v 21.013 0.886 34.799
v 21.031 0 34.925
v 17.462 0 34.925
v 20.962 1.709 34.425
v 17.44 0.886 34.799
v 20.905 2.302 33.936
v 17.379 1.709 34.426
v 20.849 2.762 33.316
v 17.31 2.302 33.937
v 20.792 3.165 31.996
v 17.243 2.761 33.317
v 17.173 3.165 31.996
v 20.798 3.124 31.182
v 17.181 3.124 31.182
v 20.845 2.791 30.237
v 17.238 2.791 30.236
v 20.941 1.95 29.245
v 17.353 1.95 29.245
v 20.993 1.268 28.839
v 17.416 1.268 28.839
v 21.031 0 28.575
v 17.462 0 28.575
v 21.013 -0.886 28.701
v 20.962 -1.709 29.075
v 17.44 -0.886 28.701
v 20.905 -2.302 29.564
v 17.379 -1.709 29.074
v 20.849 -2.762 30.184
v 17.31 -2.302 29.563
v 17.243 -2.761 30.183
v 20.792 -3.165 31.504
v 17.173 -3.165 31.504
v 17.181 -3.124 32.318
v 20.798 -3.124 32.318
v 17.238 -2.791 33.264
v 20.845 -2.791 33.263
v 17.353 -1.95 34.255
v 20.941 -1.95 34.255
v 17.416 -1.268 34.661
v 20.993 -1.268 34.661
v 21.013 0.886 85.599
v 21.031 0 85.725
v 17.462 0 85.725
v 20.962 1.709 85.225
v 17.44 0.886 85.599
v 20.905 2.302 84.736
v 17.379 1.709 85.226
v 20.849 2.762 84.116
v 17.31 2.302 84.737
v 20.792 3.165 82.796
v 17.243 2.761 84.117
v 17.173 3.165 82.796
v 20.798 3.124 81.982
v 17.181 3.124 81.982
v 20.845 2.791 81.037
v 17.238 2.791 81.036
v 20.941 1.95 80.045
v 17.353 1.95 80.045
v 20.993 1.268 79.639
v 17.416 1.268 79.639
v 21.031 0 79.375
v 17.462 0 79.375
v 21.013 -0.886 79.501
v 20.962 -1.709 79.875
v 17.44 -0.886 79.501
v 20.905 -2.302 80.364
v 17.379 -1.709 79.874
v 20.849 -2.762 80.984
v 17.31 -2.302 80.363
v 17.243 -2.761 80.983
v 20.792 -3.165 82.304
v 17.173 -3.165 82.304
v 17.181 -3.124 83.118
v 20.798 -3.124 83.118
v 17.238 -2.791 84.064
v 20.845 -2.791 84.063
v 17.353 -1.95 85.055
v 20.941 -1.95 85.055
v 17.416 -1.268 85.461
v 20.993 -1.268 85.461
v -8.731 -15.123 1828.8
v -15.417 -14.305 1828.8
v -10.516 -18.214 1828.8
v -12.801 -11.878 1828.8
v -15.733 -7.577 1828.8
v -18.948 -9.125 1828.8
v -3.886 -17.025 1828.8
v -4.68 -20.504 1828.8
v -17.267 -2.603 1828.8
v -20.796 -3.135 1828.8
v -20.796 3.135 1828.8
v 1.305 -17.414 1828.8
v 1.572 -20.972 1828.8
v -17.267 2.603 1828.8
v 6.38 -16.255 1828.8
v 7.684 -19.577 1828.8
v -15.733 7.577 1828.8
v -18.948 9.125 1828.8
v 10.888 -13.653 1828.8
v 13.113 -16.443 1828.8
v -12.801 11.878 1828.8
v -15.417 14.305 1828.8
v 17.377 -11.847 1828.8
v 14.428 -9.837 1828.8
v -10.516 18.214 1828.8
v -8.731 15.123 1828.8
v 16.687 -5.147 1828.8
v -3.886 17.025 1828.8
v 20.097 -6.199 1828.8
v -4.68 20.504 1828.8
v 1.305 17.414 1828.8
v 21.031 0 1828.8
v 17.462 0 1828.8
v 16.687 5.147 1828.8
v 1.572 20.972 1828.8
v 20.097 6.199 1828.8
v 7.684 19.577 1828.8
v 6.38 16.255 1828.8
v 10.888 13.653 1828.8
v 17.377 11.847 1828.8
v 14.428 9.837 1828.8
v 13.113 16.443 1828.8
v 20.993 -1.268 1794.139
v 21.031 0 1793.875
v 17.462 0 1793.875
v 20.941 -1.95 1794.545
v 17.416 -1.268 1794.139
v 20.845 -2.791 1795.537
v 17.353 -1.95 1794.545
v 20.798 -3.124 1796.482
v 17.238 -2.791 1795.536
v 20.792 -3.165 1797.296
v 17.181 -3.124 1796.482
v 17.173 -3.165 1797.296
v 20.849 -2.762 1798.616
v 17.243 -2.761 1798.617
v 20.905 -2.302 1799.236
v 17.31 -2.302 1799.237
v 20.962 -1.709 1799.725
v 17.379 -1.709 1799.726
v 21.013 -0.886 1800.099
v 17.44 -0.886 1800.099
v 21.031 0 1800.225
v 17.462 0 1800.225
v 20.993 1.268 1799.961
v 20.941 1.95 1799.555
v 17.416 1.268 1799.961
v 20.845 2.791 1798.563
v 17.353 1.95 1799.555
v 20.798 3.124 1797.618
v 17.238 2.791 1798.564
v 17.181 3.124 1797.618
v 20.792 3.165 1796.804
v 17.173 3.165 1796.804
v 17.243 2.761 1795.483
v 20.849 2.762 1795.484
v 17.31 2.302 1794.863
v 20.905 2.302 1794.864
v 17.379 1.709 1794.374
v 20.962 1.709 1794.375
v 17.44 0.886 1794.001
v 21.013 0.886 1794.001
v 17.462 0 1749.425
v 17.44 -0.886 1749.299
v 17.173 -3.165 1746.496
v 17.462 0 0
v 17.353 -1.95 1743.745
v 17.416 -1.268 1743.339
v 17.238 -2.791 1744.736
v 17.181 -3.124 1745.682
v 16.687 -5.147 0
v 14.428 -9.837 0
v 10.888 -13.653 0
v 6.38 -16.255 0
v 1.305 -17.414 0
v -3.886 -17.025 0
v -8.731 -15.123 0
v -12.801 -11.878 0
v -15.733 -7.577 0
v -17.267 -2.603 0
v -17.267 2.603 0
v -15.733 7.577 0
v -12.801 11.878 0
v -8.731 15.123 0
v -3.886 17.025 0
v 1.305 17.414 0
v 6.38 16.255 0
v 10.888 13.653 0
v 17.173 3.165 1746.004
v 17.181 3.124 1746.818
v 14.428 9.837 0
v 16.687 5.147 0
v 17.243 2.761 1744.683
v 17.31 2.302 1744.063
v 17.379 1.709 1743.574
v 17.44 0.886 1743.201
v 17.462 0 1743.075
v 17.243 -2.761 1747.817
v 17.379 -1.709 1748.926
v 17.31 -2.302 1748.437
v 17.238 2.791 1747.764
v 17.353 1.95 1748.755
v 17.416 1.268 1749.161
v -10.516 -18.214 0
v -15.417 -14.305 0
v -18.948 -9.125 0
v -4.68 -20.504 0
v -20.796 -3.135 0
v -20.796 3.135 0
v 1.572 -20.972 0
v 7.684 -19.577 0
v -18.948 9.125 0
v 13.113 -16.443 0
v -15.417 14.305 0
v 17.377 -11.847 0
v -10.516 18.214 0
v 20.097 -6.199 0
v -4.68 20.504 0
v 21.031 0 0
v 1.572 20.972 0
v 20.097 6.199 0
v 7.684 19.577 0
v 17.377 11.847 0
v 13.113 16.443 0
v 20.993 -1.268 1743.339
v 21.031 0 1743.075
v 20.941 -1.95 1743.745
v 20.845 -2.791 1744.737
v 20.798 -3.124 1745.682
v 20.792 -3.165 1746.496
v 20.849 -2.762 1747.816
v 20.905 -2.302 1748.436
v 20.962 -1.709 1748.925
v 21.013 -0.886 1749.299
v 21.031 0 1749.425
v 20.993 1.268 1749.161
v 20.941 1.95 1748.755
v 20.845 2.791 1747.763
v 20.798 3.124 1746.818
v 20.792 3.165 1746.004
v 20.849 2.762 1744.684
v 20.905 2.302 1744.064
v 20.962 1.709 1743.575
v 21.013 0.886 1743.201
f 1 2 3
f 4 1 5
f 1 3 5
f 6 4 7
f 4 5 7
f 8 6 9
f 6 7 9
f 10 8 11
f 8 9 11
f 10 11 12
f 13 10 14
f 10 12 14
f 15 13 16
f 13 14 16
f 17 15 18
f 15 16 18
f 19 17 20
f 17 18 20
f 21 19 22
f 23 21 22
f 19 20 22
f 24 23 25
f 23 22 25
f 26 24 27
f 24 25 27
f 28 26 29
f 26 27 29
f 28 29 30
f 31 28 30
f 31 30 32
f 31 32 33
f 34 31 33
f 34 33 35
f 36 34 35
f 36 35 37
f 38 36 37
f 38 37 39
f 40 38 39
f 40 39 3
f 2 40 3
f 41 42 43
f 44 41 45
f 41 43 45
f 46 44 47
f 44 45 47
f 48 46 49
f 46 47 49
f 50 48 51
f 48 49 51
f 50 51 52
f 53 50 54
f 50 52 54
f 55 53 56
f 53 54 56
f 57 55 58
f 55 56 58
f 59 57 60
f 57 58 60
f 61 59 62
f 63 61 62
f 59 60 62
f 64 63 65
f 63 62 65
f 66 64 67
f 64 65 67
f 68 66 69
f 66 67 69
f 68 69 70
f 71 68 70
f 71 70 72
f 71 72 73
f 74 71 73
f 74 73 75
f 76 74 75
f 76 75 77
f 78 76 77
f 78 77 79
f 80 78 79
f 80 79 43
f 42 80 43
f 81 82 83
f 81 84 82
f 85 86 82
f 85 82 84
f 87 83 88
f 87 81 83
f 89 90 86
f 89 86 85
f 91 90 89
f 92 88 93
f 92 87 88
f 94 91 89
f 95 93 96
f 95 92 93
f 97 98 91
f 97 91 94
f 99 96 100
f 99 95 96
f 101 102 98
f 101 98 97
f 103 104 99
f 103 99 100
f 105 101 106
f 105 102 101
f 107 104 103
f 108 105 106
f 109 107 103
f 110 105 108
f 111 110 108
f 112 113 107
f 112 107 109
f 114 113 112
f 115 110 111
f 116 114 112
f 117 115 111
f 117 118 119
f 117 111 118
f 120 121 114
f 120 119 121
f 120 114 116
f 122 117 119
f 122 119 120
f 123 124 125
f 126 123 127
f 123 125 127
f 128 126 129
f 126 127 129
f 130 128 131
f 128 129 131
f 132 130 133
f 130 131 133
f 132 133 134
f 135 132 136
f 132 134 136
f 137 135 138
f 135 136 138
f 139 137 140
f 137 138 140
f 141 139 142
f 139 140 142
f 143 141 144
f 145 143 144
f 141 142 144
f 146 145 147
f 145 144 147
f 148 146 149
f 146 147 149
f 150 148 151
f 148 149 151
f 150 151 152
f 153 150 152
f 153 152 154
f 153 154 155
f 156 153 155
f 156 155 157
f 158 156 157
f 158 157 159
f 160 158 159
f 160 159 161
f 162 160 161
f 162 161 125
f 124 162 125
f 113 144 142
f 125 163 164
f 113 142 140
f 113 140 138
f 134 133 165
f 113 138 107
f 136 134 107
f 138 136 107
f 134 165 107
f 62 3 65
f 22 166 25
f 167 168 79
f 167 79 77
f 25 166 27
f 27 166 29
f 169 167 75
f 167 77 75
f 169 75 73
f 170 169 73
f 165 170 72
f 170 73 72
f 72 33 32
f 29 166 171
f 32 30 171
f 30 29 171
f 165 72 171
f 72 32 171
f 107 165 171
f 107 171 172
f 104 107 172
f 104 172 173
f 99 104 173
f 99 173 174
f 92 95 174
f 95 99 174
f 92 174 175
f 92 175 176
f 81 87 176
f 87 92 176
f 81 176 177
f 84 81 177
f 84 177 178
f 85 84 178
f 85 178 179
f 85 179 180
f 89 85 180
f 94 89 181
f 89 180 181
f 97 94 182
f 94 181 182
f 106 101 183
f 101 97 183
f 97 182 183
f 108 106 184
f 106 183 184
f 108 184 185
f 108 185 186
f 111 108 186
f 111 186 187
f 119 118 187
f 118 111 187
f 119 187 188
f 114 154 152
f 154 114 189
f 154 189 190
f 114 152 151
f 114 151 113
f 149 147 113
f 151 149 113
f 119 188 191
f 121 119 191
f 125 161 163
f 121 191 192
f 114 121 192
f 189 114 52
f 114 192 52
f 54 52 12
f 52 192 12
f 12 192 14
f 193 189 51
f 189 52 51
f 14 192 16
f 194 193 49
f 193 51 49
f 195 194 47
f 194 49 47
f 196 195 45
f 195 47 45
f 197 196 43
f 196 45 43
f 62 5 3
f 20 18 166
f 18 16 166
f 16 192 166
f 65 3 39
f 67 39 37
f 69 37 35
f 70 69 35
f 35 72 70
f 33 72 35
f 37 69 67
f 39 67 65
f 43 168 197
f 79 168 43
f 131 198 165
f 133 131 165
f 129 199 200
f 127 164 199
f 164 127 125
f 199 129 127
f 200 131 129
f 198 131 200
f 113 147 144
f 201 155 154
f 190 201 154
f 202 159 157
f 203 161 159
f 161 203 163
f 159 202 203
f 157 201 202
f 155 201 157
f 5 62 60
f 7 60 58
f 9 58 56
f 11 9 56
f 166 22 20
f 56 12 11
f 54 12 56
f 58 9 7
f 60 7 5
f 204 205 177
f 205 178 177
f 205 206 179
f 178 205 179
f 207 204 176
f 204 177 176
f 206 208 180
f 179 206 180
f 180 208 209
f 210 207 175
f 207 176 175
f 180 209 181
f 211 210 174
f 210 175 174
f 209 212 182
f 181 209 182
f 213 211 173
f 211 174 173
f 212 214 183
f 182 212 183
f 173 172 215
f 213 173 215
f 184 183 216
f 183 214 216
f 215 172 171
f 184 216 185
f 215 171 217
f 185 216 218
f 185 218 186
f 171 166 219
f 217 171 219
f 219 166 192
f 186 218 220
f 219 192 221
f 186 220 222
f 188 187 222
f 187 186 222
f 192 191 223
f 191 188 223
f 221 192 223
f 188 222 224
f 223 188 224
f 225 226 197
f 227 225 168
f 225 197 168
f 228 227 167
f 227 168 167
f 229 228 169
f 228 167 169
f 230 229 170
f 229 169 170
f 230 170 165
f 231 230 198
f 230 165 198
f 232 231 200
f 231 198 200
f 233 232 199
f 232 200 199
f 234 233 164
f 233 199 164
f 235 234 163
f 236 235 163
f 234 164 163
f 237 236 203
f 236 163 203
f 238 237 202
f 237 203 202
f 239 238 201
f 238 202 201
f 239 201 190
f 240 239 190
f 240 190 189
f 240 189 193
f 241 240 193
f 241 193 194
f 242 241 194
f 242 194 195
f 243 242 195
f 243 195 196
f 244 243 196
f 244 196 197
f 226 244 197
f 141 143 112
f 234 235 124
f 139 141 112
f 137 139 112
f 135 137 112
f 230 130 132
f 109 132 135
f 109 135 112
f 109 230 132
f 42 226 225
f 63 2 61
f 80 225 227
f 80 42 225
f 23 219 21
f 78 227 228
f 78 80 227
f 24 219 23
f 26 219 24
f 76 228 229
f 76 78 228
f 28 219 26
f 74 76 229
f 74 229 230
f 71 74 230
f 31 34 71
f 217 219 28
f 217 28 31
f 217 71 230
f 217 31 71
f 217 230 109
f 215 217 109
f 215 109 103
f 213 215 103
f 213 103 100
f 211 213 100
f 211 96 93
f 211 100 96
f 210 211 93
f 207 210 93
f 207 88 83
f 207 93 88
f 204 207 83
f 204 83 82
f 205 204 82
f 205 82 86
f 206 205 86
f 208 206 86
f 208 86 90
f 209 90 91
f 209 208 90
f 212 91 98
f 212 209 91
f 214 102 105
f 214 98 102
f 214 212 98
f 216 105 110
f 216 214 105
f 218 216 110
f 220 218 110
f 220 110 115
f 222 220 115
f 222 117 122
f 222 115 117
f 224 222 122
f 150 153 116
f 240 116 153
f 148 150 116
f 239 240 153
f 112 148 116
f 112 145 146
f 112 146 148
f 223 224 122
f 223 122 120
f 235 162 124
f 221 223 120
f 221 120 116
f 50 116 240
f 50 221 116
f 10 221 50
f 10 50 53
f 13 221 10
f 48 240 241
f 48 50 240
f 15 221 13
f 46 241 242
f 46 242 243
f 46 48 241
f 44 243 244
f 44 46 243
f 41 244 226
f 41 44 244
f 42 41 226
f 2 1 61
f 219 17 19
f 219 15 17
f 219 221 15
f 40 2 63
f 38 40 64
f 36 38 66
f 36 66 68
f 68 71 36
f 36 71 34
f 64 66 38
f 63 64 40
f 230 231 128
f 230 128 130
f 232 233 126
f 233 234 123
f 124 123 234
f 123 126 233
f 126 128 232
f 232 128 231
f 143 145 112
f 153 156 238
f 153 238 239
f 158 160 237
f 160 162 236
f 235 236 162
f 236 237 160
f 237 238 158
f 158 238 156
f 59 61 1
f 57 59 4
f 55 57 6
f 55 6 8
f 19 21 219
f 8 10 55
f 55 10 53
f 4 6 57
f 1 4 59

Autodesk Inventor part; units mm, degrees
ref_plane "XZ Plane" through (0, 0, 0) normal (0, 1, 0) x (-1, 0, 0)
sketch "Sketch1" plane through (0, 0, 0) normal (0, 0, 1) x (1, 0, 0)
  circle A0 centre (0, 0) radius 21.0312
  circle A1 centre (0, 0) radius 17.4625
  dimension "d0" = 42.0624
  dimension "d1" = 34.925
extrude "Extrusion1" add sketch "Sketch1" along normal blind 1828.8
ref_plane "Work Plane1" through (0, 0, 0) normal (1, 0, 0) x (0, 0, 1)
sketch "Sketch2" plane through (0, 0, 0) normal (1, 0, 0) x (0, 0, 1)
  circle A0 centre (31.75, 0) radius 3.175
  line L0 (-365.76, 0) -> (2194.56, 0) projected
  line L1 (0, 21.0312) -> (0, -21.0312) projected
  dimension "d5" = 6.35
  dimension "d6" = 31.75
extrude "Extrusion2" cut sketch "Sketch2" along normal blind 381
pattern_linear "Rectangular Pattern1" count 2 spacing 50.8 along (0, 0, 1) of "Extrusion2"
ref_plane "Work Plane2" through (0, 0, 914.4) normal (0, 0, 1) x (1, 0, 0)
mirror "Mirror1" about plane through (0, 0, 914.4) normal (0, 0, 1) of "Extrusion2", "Rectangular Pattern1"
properties part number "FE-00005-04"
